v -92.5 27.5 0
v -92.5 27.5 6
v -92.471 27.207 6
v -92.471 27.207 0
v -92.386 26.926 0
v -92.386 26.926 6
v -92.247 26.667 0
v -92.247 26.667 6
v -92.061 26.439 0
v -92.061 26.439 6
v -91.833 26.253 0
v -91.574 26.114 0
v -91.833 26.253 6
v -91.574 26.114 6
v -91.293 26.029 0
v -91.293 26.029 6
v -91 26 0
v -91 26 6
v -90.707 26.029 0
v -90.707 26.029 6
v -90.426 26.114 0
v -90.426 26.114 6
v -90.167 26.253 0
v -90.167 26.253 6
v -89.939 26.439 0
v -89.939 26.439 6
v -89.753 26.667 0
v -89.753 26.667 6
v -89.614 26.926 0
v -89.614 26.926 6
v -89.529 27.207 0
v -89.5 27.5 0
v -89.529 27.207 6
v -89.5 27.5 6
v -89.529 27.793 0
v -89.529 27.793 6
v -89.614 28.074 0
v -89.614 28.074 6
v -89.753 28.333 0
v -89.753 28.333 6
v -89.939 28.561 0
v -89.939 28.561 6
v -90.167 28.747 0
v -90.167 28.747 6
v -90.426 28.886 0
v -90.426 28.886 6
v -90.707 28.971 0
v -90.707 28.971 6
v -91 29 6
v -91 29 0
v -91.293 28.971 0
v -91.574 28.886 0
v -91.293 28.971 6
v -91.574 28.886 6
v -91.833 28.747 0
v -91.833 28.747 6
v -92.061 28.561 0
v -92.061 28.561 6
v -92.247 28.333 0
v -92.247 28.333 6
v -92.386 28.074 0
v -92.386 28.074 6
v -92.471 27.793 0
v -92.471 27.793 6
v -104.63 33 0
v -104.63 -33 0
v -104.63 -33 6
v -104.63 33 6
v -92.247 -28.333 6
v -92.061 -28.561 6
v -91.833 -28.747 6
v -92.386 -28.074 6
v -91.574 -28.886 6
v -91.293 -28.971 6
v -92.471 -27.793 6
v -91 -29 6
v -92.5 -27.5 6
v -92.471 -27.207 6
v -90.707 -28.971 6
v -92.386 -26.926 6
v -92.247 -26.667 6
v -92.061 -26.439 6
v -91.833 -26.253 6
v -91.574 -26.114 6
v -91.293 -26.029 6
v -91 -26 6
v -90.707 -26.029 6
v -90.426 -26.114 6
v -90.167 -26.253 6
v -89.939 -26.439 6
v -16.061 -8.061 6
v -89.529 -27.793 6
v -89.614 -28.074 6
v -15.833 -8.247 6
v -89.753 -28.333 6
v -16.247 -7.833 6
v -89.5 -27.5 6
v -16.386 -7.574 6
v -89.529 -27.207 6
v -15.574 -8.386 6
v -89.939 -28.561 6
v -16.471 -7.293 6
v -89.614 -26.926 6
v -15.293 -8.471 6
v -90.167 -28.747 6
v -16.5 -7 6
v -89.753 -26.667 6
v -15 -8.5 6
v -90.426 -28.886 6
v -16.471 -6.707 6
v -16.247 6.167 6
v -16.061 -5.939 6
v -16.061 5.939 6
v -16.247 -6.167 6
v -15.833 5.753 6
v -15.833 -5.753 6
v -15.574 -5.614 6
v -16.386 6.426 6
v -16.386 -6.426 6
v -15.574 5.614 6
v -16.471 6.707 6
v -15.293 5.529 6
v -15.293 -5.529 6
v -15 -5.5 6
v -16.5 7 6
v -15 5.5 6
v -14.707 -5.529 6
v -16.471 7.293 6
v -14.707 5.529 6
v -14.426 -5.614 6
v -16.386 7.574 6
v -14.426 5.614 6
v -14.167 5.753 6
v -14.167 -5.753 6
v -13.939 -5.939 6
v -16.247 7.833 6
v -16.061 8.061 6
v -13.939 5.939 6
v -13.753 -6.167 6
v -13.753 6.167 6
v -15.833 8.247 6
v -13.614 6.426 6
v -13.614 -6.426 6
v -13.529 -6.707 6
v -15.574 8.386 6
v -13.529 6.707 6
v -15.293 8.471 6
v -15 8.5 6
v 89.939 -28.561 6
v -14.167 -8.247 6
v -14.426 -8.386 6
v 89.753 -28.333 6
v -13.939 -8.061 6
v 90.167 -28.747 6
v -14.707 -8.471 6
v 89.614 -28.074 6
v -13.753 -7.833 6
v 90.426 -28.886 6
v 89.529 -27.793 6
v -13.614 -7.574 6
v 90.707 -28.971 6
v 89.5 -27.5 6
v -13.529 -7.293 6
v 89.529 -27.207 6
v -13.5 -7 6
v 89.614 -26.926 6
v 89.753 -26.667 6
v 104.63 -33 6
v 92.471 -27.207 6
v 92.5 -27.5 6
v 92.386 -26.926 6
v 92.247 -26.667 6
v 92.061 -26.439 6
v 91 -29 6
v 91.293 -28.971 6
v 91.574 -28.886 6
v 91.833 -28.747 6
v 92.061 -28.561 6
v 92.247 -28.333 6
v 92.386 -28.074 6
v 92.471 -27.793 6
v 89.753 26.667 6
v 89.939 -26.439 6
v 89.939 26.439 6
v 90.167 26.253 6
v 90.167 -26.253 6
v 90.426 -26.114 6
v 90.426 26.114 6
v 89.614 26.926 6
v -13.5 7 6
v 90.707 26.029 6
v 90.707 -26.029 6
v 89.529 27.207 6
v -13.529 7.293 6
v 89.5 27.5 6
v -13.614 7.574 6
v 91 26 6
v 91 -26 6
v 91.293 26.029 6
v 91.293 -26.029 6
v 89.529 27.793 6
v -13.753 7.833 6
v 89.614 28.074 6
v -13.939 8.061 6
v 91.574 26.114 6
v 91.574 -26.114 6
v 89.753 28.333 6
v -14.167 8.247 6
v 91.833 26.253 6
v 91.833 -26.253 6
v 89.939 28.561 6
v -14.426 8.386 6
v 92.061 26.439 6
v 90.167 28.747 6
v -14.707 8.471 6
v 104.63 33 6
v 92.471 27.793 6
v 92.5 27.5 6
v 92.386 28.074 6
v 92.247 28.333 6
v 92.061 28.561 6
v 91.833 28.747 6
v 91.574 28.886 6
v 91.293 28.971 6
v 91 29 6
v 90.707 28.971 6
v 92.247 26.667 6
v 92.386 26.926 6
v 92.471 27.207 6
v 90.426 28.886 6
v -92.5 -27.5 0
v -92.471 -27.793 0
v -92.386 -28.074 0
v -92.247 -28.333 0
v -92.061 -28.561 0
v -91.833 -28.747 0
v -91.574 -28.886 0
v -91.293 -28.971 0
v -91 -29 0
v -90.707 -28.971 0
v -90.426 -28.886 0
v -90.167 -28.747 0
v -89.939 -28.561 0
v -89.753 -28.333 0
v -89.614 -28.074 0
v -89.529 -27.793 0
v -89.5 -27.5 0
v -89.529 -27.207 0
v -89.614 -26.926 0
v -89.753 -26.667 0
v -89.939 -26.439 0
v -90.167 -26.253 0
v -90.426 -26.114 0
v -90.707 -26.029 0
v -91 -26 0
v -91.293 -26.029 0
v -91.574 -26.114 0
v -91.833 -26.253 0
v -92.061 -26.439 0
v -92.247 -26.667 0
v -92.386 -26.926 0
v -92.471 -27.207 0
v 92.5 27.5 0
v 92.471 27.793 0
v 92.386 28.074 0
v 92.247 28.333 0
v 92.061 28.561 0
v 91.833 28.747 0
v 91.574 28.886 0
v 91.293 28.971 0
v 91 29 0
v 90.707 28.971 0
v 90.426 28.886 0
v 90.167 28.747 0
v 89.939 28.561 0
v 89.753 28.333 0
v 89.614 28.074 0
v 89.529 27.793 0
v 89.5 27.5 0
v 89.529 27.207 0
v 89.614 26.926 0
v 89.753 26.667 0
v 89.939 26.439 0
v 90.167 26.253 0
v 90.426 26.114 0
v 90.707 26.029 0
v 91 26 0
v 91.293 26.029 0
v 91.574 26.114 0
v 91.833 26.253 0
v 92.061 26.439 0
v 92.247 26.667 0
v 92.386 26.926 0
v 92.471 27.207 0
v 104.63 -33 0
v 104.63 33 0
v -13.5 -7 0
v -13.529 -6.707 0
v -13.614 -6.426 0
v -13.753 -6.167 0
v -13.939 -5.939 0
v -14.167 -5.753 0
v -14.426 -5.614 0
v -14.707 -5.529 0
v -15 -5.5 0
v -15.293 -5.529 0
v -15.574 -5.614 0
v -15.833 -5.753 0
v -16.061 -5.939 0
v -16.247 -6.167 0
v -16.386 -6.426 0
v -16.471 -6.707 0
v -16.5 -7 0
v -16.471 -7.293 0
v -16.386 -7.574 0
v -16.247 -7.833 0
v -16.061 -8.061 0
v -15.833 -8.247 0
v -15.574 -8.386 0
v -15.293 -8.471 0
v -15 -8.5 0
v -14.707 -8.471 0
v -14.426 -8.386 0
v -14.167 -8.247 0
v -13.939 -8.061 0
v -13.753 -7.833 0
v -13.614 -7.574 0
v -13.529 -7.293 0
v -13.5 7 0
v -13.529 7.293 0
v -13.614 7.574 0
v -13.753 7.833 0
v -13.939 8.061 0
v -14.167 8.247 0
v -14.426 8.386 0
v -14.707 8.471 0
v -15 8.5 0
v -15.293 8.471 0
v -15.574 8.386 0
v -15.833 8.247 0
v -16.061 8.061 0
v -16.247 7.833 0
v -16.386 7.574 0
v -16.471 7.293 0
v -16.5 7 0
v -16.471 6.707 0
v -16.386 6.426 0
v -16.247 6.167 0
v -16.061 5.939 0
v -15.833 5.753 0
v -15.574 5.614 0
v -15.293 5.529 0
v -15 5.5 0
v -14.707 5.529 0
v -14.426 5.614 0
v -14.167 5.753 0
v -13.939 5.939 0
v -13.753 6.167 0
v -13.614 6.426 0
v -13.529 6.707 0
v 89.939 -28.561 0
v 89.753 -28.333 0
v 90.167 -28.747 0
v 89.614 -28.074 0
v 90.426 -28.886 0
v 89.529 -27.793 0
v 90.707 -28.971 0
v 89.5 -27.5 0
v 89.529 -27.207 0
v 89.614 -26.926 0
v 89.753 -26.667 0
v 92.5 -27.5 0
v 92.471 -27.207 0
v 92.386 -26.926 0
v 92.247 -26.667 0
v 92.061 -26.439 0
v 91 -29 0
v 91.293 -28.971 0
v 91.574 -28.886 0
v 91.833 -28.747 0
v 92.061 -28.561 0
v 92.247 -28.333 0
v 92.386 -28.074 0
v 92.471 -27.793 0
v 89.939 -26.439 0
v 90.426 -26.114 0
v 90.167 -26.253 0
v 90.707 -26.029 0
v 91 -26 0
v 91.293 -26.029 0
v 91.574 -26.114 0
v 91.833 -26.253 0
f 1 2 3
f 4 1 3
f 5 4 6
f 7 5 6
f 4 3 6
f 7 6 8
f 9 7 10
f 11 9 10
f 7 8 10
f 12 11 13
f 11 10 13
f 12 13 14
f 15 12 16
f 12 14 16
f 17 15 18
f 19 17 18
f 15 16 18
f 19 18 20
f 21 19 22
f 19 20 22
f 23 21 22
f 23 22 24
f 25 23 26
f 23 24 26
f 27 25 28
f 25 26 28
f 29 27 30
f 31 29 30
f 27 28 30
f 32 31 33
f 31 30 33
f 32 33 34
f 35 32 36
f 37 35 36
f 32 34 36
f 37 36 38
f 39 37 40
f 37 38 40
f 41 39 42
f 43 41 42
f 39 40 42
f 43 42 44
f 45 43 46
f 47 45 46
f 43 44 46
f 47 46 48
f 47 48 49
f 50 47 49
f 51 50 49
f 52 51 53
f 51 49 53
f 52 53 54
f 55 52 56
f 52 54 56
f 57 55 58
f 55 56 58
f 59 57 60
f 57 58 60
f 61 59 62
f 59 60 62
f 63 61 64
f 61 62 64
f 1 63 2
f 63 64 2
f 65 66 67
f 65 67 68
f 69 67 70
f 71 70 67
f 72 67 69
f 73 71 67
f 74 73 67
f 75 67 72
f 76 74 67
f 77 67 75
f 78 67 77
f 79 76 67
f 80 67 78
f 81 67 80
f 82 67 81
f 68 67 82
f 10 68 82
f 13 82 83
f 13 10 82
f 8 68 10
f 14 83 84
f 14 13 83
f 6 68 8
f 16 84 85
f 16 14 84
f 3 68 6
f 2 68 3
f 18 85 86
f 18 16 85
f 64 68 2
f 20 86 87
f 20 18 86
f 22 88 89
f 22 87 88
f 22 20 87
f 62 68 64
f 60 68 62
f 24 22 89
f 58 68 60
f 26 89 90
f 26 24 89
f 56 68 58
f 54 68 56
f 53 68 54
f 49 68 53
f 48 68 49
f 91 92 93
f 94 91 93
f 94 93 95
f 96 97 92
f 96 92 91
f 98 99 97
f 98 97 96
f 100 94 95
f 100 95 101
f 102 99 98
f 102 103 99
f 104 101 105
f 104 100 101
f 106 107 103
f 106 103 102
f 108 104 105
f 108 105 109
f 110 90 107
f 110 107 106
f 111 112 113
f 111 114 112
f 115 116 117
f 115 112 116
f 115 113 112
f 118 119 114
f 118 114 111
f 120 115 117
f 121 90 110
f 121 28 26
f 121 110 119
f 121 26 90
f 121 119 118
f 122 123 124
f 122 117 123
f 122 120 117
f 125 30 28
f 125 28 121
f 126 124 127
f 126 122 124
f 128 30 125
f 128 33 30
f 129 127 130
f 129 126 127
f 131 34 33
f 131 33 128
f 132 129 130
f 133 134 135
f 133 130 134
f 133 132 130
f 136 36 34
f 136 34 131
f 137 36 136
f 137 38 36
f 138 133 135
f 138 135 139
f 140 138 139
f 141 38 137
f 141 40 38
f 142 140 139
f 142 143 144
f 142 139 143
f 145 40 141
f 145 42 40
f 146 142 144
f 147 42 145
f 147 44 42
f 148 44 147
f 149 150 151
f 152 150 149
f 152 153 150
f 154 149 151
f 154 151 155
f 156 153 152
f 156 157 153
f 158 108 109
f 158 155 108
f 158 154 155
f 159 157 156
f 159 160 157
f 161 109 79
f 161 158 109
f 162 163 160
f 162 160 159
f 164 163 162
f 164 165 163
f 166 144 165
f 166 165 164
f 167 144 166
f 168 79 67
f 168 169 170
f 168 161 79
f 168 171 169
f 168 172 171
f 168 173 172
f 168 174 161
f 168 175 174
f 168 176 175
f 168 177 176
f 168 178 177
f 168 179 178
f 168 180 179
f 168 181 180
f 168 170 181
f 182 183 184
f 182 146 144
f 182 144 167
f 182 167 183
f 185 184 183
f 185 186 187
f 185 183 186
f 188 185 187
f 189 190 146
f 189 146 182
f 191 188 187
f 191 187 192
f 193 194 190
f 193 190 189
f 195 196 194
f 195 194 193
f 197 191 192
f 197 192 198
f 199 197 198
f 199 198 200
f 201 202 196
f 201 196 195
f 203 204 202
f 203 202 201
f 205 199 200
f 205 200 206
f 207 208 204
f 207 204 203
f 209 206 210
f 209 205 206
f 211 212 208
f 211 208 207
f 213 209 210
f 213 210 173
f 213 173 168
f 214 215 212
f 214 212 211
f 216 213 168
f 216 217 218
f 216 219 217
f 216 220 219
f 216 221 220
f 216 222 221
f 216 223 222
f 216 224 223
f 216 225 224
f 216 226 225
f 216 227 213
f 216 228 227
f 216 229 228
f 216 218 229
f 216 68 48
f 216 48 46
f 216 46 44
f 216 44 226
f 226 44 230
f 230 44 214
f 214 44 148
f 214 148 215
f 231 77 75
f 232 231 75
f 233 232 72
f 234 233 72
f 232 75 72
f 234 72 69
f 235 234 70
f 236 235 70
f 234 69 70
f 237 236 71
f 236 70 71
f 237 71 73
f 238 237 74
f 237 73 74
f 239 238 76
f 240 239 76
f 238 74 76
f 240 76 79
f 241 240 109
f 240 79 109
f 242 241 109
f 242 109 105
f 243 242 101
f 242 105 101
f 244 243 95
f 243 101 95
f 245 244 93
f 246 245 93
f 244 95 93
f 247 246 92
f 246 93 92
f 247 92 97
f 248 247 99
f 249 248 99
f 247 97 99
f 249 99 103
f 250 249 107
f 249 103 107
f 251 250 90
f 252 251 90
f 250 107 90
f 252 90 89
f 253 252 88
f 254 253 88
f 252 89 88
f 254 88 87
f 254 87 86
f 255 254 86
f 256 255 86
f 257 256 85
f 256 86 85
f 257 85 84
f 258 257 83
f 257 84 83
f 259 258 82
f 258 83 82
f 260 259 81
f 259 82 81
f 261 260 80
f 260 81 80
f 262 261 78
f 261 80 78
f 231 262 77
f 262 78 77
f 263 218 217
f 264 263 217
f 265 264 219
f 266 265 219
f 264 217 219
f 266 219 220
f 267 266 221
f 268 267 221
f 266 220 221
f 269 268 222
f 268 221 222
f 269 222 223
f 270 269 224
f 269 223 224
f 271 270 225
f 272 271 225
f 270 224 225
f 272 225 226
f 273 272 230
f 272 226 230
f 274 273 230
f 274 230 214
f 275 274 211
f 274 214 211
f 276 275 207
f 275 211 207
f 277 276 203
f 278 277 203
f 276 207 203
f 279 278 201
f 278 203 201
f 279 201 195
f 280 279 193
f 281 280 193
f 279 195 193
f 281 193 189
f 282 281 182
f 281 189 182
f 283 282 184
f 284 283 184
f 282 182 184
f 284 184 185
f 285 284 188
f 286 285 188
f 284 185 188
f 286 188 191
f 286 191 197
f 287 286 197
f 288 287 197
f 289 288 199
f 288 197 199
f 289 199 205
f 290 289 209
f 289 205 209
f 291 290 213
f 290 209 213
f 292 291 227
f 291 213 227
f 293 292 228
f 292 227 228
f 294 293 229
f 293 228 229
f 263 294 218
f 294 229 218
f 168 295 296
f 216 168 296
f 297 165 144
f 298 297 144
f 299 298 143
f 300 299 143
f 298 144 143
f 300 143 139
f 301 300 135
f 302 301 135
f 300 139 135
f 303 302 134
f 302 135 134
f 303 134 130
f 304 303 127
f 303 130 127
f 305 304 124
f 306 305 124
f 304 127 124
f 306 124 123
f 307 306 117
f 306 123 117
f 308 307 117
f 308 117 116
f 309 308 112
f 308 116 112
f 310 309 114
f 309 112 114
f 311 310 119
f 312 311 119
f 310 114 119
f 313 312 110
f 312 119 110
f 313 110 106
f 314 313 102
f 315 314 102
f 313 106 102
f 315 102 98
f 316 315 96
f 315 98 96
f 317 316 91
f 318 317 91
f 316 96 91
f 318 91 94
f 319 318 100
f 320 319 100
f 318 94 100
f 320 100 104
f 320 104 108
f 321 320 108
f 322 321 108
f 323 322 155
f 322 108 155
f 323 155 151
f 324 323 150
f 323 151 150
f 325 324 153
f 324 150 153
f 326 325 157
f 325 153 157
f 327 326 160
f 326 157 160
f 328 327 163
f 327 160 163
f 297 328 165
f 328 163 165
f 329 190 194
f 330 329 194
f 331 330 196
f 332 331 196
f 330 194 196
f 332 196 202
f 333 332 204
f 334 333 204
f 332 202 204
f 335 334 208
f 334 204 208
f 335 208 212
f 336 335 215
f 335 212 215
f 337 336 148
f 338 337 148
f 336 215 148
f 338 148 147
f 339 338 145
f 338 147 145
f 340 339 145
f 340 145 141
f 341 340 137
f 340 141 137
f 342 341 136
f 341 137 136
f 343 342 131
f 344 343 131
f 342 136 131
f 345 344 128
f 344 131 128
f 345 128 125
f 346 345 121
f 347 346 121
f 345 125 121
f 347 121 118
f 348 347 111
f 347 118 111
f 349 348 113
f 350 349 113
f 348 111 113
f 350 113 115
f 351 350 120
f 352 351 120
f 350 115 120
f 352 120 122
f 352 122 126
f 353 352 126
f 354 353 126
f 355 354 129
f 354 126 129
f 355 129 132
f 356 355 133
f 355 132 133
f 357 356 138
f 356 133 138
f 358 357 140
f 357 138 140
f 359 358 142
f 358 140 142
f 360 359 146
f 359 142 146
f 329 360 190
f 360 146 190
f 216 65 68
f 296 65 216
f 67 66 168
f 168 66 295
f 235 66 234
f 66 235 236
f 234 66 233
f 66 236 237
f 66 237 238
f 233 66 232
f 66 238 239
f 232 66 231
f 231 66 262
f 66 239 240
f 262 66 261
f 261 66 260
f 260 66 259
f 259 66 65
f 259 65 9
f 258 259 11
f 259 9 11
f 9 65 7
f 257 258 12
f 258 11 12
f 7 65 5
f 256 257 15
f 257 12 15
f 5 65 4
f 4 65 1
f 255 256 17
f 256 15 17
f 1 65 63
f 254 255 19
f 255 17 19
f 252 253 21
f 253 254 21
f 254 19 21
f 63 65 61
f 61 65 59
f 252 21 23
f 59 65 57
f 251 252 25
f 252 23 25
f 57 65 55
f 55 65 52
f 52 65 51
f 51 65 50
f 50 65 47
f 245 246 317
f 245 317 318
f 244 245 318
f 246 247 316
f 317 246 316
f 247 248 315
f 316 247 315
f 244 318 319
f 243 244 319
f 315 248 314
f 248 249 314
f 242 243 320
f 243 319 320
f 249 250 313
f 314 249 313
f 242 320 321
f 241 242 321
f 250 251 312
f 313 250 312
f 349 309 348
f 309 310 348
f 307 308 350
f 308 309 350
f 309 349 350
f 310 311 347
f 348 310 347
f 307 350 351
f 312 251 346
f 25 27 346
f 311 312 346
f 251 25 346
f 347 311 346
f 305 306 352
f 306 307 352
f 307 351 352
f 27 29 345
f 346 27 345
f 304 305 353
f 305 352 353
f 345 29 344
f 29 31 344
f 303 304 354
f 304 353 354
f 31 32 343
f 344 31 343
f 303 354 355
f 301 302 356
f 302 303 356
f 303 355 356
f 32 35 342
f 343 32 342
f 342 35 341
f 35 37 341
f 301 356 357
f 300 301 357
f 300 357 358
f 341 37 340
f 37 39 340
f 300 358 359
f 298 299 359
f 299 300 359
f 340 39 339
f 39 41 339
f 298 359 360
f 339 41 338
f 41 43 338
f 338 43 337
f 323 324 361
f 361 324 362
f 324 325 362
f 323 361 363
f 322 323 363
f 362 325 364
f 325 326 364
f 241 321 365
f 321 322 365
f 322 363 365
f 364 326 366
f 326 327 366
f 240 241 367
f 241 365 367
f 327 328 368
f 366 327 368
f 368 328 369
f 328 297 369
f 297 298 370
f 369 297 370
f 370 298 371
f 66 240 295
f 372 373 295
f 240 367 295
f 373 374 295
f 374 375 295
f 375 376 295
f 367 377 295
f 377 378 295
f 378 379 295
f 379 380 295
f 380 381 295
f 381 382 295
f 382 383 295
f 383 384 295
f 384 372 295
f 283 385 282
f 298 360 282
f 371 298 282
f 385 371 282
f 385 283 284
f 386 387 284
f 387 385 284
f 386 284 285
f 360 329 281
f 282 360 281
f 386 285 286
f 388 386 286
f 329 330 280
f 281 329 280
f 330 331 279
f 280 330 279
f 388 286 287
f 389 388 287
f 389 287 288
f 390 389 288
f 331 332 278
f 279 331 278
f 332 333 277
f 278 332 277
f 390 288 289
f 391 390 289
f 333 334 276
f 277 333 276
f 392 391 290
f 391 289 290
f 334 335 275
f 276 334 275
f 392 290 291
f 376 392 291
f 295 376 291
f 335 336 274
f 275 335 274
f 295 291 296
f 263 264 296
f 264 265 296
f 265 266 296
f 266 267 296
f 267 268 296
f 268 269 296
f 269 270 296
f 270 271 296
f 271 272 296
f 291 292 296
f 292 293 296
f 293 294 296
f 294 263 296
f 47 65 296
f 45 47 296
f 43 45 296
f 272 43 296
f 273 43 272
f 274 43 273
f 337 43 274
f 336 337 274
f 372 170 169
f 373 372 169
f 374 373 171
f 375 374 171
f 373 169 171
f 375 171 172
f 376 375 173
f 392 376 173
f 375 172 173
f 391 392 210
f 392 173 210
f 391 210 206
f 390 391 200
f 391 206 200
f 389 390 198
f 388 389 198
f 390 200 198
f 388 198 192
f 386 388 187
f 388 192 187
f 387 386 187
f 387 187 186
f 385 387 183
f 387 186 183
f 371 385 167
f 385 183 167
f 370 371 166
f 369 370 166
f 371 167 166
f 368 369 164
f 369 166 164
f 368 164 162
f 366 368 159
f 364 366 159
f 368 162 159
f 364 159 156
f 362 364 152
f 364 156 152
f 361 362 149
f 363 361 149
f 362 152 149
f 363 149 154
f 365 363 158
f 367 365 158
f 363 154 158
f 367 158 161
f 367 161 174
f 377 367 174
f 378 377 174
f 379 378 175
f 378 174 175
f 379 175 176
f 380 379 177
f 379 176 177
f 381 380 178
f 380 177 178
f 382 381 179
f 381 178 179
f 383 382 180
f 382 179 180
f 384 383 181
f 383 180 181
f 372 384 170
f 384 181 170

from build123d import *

# Parameters (mm, degrees)
ESQUISSE1_W             = 209.26
ESQUISSE1_H             = 66
BOSS_EXTRU_1_DEPTH      = 6
ESQUISSE2_R             = 1.5
ENL_V_MAT_EXTRU_1_DEPTH = 6


with BuildPart() as part:
    # Esquisse1 → Boss.-Extru.1 (new body)
    with BuildSketch(Plane.XY):
        Rectangle(ESQUISSE1_W, ESQUISSE1_H)
    extrude(amount=BOSS_EXTRU_1_DEPTH)

    # Esquisse2 → Enlèv. mat.-Extru.1 (cut)
    with BuildSketch(Plane.XY.offset(6)):
        with Locations((-15, 7)):
            Circle(ESQUISSE2_R)
        with Locations((-15, -7)):
            Circle(ESQUISSE2_R)
        with Locations((91, 27.5)):
            Circle(ESQUISSE2_R)
        with Locations((91, -27.5)):
            Circle(ESQUISSE2_R)
        with Locations(Location((-91, -27.5, 0), (0, 0, 180))):
            Circle(ESQUISSE2_R)
        with Locations(Location((-91, 27.5, 0), (0, 0, 180))):
            Circle(ESQUISSE2_R)
    extrude(amount=-ENL_V_MAT_EXTRU_1_DEPTH, mode=Mode.SUBTRACT)


solid = part.part
